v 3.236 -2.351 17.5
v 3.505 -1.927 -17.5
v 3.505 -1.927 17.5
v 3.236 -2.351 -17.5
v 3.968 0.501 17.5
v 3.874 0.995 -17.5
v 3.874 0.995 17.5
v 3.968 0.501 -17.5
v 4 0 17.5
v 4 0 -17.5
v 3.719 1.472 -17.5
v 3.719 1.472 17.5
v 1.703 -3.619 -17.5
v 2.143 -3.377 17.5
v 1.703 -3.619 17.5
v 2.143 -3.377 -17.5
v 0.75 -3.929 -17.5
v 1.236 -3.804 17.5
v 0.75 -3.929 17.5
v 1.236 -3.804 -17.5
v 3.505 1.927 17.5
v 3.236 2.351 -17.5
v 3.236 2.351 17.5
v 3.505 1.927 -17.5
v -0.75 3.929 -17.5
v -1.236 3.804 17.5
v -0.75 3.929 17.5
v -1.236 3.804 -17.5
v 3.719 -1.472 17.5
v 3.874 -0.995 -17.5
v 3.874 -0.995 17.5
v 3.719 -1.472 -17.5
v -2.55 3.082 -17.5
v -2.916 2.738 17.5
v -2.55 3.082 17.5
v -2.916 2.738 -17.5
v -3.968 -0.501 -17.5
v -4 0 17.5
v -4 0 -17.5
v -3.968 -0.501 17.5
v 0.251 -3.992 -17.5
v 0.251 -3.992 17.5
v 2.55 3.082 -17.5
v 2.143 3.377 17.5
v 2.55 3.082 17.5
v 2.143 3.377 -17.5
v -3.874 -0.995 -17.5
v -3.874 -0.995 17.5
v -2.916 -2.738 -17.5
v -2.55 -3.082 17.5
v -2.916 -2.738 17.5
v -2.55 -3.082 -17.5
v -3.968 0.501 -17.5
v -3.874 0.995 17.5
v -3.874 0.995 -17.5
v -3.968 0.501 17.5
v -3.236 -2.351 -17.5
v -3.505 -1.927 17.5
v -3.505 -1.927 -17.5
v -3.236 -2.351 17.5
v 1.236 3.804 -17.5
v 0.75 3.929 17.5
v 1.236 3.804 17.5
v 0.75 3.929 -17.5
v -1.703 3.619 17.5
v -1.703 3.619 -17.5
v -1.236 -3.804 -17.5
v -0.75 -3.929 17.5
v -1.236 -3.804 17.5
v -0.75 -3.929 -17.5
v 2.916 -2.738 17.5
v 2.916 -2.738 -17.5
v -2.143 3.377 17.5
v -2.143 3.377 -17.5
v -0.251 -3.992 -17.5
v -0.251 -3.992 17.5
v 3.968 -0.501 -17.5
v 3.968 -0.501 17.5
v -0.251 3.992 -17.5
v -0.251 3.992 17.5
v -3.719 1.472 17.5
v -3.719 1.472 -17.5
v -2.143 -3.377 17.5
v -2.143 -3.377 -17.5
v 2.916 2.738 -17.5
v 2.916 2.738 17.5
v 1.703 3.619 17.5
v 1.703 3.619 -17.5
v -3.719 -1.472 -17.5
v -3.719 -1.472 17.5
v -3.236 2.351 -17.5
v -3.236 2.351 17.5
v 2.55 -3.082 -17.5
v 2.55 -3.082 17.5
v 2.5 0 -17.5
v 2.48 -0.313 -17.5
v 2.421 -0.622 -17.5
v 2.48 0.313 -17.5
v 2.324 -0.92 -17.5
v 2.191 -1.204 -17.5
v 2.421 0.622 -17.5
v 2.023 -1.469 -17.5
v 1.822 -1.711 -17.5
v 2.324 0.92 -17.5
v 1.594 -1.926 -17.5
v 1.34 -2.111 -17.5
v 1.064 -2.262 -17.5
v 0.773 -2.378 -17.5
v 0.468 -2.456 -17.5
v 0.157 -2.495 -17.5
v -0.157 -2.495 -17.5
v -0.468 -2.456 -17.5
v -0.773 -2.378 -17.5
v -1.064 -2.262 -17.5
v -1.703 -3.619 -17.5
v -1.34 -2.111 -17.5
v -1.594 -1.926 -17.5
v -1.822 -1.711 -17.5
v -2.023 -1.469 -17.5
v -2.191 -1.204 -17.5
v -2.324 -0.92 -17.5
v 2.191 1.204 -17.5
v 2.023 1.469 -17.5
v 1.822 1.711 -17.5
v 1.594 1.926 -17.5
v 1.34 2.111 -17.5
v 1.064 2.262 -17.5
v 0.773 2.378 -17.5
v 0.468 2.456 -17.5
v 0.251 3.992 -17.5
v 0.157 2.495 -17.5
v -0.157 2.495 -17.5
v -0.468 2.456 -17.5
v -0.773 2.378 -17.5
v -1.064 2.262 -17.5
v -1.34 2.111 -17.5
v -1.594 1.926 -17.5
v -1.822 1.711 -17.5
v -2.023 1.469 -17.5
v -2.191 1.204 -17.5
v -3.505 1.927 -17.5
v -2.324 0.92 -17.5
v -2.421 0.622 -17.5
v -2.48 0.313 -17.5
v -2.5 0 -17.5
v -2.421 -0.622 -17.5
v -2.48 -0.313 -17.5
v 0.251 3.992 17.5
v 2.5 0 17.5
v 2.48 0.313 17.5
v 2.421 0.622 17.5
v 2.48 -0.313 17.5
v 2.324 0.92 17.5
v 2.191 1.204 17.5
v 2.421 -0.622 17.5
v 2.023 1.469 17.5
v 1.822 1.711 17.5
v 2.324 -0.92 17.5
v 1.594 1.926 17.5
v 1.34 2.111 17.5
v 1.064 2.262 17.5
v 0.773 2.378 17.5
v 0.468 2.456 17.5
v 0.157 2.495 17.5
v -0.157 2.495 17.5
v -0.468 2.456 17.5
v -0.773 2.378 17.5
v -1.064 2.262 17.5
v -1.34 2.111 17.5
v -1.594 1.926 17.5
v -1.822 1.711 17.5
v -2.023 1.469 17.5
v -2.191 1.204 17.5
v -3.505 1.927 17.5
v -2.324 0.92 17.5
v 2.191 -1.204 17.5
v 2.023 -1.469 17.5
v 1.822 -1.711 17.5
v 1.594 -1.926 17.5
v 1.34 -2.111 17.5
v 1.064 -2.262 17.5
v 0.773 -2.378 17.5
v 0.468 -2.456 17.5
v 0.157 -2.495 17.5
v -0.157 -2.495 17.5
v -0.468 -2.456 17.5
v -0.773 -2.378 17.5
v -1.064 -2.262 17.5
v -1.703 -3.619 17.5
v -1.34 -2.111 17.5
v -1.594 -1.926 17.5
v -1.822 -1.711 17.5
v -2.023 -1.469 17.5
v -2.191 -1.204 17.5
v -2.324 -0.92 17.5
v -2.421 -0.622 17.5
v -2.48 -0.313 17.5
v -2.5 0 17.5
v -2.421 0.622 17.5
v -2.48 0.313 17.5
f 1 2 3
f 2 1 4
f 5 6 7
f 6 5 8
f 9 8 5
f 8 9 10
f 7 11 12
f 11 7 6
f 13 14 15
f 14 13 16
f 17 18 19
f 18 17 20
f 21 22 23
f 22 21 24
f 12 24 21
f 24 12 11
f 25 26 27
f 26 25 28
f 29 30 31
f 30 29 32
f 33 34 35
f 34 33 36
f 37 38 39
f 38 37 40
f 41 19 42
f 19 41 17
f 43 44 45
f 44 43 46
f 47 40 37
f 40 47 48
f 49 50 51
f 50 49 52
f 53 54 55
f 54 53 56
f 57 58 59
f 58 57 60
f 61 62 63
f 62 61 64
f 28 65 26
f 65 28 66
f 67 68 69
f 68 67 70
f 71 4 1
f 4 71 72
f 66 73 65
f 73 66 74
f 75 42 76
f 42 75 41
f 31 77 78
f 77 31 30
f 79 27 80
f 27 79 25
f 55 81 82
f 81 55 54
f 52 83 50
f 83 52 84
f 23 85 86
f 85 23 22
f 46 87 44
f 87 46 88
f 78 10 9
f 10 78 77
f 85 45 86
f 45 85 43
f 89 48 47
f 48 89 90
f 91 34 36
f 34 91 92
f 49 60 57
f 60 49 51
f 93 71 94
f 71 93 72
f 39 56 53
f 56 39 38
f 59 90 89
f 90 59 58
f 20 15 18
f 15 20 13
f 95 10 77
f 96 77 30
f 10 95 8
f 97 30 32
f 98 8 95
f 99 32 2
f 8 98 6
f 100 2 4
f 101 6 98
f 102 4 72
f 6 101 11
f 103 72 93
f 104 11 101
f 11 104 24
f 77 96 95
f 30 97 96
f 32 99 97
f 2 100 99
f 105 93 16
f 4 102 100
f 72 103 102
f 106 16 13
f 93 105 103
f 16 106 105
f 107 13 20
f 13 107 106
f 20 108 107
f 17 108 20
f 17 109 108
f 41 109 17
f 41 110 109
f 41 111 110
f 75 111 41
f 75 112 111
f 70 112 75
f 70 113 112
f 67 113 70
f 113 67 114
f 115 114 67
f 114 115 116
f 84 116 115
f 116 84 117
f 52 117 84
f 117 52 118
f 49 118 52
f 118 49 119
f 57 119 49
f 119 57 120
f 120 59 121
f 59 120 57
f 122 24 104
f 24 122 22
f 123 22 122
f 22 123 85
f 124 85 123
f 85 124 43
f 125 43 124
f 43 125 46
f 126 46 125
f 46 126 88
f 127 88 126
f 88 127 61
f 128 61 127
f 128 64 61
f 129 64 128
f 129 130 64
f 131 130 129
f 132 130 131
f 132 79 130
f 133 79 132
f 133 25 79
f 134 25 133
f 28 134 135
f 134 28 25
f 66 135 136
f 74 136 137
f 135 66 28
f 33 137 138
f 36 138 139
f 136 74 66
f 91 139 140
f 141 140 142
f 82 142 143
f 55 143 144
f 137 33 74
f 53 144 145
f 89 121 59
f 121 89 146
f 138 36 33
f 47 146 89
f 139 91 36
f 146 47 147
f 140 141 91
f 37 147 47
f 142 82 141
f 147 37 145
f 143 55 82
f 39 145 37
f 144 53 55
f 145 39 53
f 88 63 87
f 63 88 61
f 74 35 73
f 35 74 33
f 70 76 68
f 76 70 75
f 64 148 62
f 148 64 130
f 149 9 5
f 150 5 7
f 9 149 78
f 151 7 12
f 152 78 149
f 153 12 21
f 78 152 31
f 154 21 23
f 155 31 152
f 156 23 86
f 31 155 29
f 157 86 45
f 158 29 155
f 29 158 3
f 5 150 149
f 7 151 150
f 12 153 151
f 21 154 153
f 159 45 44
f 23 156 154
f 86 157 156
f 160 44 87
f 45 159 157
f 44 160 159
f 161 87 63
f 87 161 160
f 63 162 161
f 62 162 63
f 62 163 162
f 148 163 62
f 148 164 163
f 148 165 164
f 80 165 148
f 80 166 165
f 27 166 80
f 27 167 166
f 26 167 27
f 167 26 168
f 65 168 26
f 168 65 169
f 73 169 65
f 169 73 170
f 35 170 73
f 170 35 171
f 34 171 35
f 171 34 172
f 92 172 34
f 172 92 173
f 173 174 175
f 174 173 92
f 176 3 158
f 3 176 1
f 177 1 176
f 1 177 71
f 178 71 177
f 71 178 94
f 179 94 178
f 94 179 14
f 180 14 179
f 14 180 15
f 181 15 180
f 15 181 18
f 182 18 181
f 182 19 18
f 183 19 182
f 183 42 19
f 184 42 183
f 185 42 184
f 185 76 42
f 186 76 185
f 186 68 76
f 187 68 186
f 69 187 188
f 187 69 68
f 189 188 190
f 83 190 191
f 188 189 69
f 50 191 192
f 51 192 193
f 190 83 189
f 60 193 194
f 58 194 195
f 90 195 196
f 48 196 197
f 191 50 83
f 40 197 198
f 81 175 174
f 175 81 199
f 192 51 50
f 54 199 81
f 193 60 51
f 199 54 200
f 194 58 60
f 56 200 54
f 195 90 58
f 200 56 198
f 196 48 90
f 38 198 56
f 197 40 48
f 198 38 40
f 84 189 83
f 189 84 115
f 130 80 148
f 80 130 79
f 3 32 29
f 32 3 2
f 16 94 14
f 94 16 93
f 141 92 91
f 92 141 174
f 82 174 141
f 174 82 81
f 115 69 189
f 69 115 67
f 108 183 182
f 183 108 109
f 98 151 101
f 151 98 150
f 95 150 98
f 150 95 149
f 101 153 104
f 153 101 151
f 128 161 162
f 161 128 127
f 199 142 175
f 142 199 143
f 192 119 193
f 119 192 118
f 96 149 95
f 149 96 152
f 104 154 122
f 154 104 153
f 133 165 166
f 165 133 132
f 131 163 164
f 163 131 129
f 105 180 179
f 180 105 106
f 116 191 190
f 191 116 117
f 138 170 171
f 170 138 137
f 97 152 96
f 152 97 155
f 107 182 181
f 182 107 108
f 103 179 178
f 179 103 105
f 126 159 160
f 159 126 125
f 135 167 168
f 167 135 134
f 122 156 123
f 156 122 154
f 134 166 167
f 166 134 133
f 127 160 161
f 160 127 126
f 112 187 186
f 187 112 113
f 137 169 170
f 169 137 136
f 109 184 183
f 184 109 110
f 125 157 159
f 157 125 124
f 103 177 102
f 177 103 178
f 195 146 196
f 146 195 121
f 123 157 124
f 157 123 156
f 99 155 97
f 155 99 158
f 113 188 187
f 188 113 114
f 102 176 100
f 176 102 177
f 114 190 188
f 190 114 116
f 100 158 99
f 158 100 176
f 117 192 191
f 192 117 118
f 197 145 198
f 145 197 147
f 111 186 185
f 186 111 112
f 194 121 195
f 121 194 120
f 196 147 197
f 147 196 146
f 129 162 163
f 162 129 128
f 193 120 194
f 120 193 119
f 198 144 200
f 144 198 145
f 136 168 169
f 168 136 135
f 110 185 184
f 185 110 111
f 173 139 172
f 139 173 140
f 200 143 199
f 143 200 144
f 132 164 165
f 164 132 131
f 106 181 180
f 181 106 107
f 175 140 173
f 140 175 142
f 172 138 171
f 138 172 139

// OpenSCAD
$fn = 50;


difference() {
	union() {
		translate(v = [0, 0, -17.5000000000]) {
			cylinder(h = 35, r = 4.0000000000);
		}
	}
	union() {
		translate(v = [0, 0, -100.0000000000]) {
			cylinder(h = 200, r = 2.5000000000);
		}
	}
}
